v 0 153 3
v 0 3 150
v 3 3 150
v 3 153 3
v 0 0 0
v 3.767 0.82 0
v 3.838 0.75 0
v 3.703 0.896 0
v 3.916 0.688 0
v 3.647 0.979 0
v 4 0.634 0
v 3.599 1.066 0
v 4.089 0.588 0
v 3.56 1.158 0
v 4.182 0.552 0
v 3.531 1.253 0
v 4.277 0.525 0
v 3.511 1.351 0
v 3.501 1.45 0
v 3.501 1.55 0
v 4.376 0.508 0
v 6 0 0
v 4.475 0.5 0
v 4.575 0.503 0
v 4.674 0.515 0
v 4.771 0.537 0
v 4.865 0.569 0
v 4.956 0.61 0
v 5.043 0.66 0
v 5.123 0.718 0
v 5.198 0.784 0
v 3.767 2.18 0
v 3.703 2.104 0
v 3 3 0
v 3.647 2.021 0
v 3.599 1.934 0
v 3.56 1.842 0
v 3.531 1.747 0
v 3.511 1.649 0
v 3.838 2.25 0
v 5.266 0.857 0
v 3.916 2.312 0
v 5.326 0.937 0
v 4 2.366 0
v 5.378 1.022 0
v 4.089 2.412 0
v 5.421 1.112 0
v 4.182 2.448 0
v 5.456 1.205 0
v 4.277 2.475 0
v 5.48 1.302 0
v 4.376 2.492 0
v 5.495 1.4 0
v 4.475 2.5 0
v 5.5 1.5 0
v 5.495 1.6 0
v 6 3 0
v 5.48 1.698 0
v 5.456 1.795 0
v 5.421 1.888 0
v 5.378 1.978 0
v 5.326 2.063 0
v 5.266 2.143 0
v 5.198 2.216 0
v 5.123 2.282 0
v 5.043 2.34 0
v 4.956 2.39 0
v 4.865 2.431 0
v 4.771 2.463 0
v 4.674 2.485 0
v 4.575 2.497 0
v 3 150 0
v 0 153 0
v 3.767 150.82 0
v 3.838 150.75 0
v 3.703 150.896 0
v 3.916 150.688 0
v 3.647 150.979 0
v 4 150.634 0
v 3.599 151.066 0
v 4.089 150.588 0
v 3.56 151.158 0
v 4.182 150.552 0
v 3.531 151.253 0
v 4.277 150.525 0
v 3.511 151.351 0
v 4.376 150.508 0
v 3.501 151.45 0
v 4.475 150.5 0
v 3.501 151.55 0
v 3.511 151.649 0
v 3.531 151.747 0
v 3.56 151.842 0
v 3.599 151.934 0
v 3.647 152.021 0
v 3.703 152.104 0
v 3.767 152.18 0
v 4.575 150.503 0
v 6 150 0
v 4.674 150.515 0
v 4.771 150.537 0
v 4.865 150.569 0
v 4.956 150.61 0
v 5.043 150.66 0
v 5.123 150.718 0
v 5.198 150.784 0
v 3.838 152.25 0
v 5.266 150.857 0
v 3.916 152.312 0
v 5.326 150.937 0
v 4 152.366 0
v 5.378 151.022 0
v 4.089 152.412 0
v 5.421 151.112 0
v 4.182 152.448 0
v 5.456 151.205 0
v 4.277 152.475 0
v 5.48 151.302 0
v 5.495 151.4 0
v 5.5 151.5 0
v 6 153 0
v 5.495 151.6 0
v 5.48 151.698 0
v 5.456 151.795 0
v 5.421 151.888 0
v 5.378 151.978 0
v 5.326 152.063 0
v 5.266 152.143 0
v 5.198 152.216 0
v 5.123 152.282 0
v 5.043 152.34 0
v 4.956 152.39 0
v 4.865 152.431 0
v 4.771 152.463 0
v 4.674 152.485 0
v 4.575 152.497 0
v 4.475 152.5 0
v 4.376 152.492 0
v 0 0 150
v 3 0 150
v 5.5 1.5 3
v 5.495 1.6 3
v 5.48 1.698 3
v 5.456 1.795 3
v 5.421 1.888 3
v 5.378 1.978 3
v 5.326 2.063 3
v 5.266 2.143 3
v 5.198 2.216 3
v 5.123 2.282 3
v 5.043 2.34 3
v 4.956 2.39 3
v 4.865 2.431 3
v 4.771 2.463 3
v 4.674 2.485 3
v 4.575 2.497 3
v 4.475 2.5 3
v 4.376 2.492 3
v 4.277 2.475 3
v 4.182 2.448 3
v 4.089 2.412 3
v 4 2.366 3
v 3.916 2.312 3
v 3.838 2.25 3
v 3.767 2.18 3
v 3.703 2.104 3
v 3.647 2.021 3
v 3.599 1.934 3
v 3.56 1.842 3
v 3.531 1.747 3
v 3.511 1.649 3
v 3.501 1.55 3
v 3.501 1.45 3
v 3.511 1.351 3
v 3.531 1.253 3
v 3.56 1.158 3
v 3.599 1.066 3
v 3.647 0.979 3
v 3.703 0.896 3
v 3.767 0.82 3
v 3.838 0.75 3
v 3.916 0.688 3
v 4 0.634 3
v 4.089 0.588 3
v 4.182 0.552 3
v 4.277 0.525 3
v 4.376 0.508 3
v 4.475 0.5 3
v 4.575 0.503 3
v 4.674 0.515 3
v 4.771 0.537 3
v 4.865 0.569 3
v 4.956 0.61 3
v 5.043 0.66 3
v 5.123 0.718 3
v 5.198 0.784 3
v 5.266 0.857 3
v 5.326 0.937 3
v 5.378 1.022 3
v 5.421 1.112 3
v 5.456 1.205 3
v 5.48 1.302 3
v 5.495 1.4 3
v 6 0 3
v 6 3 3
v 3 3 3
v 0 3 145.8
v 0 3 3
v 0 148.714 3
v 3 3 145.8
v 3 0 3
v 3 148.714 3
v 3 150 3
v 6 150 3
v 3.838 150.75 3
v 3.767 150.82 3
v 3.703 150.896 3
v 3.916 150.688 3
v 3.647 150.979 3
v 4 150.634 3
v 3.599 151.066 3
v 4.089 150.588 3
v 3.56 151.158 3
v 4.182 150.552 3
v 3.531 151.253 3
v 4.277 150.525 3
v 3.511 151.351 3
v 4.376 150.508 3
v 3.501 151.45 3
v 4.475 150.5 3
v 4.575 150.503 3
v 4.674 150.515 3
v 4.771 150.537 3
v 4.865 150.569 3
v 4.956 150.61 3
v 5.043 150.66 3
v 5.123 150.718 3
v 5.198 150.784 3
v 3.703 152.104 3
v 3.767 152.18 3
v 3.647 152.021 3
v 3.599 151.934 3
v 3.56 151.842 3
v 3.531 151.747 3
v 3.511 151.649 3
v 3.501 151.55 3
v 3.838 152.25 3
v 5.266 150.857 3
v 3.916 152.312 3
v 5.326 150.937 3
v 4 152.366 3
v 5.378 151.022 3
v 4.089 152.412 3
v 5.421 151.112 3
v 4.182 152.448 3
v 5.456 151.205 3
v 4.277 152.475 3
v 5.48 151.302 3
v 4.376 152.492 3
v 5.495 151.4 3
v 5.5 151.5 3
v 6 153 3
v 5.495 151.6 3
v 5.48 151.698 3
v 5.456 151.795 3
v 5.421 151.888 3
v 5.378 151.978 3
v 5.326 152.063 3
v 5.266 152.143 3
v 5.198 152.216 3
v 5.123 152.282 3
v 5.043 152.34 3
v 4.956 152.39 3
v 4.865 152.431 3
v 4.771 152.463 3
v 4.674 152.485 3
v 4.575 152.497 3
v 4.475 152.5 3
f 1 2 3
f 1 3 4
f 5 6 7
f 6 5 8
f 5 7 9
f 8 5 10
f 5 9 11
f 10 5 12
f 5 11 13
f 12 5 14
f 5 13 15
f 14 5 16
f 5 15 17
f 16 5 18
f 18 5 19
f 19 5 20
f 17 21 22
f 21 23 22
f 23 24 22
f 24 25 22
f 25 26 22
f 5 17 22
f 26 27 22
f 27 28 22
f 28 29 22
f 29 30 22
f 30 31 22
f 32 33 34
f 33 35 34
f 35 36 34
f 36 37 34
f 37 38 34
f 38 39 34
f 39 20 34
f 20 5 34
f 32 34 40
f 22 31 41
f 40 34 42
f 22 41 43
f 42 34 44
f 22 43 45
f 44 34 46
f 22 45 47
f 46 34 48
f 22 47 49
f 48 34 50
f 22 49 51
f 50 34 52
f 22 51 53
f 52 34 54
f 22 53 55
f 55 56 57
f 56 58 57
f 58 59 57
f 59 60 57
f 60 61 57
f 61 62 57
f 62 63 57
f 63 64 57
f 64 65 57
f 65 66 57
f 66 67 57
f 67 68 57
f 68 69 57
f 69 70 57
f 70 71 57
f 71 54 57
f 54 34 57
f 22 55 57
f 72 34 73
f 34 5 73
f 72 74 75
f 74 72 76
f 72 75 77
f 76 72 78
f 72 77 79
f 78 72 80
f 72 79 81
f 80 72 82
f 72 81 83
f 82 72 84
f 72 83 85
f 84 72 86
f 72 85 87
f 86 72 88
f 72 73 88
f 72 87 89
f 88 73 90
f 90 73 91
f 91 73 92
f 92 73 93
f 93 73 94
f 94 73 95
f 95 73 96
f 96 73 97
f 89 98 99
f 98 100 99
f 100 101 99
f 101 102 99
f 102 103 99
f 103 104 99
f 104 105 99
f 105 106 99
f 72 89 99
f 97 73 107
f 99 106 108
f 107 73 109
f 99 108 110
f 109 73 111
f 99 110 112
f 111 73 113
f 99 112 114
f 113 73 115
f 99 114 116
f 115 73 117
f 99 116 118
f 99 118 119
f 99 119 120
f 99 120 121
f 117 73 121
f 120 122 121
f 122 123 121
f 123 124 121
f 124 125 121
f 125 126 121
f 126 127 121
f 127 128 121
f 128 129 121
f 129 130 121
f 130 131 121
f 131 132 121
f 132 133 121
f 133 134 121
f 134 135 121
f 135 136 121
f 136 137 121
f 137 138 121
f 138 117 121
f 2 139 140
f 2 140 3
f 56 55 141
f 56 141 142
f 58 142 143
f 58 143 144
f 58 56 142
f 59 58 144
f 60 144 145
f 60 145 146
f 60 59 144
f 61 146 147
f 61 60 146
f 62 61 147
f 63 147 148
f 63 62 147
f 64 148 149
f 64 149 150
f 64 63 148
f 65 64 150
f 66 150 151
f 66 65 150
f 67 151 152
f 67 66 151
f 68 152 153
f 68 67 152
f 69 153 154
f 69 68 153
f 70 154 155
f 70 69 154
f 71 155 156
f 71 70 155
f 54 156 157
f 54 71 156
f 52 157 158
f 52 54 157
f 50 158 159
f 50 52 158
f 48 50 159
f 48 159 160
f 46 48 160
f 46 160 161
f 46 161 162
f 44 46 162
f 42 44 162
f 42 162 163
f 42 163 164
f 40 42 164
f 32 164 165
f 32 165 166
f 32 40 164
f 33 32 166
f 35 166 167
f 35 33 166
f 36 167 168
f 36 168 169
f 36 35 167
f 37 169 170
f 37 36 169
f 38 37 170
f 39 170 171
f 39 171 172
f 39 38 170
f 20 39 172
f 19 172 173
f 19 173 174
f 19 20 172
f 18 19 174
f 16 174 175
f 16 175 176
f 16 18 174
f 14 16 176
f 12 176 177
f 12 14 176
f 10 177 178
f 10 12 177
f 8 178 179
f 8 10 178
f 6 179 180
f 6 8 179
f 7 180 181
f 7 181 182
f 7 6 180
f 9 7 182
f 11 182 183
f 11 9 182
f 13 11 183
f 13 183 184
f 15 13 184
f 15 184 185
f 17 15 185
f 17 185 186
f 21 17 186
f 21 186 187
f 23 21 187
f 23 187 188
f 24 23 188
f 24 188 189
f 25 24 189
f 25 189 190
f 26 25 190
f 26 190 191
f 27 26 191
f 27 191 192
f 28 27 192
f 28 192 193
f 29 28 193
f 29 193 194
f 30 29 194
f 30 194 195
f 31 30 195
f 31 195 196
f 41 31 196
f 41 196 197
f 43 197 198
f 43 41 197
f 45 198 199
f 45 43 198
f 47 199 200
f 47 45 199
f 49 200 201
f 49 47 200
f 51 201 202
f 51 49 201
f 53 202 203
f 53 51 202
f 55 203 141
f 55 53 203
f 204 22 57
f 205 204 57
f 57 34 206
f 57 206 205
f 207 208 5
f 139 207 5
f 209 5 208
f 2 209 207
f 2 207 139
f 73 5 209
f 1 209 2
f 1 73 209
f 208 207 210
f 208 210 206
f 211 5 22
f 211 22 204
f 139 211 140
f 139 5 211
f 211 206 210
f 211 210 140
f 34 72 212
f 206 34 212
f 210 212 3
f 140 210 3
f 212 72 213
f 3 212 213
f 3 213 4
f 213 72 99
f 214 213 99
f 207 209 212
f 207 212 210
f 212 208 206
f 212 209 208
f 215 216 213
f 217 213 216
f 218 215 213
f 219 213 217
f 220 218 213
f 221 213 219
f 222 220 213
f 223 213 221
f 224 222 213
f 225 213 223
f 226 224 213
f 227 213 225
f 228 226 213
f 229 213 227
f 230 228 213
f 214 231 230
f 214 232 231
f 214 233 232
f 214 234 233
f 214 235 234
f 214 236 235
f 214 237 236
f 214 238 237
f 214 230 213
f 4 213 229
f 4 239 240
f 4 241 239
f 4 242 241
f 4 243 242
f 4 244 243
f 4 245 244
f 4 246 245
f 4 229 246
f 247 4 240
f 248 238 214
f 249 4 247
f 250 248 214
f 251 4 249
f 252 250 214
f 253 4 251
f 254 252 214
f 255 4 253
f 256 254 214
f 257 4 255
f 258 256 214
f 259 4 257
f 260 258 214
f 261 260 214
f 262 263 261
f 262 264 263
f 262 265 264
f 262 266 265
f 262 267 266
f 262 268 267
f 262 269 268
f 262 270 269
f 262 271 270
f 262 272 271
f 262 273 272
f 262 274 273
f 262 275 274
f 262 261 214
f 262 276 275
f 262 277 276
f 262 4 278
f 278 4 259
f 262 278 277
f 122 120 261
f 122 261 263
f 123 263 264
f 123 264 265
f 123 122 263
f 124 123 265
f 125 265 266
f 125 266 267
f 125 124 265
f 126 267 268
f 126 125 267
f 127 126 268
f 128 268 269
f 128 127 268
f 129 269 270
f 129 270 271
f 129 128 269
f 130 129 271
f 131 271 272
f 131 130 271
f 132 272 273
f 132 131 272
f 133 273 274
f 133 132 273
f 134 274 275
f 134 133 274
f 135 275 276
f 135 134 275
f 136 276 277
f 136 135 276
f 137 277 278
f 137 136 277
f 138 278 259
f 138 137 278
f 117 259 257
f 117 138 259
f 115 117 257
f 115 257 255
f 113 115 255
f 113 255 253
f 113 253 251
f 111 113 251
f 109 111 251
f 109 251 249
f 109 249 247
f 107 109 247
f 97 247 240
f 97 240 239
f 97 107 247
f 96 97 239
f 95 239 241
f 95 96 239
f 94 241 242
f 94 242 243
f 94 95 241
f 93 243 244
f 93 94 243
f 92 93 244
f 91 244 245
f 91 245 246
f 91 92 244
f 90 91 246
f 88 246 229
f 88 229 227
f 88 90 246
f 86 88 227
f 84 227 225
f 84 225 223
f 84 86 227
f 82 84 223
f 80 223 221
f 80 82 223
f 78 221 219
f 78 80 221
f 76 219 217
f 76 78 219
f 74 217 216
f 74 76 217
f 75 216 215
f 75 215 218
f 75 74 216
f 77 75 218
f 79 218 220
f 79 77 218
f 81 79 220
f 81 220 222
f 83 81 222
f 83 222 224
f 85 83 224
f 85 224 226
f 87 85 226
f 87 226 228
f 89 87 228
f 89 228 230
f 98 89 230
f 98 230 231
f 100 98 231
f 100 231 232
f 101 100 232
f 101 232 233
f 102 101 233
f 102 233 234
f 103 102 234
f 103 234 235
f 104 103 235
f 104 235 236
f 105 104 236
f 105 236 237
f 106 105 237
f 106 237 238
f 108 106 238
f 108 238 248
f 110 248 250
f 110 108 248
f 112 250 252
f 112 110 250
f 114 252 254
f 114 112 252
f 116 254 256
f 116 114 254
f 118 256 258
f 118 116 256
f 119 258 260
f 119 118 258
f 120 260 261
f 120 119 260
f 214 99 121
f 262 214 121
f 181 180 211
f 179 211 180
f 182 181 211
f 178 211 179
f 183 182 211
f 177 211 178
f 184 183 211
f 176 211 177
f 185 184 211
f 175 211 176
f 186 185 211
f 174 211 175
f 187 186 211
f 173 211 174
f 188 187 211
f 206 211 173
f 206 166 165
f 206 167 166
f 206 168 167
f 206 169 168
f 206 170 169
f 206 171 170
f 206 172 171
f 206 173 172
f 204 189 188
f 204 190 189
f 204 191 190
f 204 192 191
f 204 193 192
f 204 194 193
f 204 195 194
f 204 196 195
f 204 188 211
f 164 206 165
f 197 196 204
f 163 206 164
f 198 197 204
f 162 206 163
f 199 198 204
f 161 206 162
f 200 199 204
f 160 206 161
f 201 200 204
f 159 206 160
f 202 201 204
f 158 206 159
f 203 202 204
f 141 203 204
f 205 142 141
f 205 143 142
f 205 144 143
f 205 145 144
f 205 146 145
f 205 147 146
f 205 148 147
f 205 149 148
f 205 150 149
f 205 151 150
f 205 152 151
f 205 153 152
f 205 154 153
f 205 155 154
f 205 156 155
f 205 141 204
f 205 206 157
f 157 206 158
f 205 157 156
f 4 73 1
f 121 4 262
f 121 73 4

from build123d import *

# Parameters (mm, degrees)
SKICA1_W                = 3
SKICA1_H                = 3
SKICA1_R                = 1
SKICA1_H_2              = 147
P_IDAT_VYSUNUT_M1_DEPTH = 3
P_IDAT_VYSUNUT_M3_DEPTH = 3


with BuildPart() as part:
    # Skica1 → Přidat vysunutím1 (new body)
    # profile 1 of 5: a face of its own
    with BuildSketch(Plane.XY):
        with Locations((4.5, 151.5)):
            Rectangle(SKICA1_W, SKICA1_H)
        with Locations((4.5, 151.5)):
            Circle(SKICA1_R, mode=Mode.SUBTRACT)
    # profile 2 of 5: a face of its own
    with BuildSketch(Plane.XY):
        with Locations((1.5, 151.5)):
            Rectangle(SKICA1_W, SKICA1_H)
    # profile 3 of 5: a face of its own
    with BuildSketch(Plane.XY):
        with Locations((1.5, 76.5)):
            Rectangle(SKICA1_W, SKICA1_H_2)
    # profile 4 of 5: a face of its own
    with BuildSketch(Plane.XY):
        with Locations((1.5, 1.5)):
            Rectangle(SKICA1_W, SKICA1_H)
    # profile 5 of 5: a face of its own
    with BuildSketch(Plane.XY):
        with Locations((4.5, 1.5)):
            Rectangle(SKICA1_W, SKICA1_H)
        with Locations((4.5, 1.5)):
            Circle(SKICA1_R, mode=Mode.SUBTRACT)
    extrude(amount=P_IDAT_VYSUNUT_M1_DEPTH)

    # Skica6 → Přidat vysunutím3 (add)
    with BuildSketch(Plane.ZY):
        Polygon((150, 3), (3, 153), (3, 148.713848419), (145.79957145, 3), (3, 3), (3, 0), (150, 0), align=None)
    extrude(amount=-P_IDAT_VYSUNUT_M3_DEPTH)


solid = part.part
